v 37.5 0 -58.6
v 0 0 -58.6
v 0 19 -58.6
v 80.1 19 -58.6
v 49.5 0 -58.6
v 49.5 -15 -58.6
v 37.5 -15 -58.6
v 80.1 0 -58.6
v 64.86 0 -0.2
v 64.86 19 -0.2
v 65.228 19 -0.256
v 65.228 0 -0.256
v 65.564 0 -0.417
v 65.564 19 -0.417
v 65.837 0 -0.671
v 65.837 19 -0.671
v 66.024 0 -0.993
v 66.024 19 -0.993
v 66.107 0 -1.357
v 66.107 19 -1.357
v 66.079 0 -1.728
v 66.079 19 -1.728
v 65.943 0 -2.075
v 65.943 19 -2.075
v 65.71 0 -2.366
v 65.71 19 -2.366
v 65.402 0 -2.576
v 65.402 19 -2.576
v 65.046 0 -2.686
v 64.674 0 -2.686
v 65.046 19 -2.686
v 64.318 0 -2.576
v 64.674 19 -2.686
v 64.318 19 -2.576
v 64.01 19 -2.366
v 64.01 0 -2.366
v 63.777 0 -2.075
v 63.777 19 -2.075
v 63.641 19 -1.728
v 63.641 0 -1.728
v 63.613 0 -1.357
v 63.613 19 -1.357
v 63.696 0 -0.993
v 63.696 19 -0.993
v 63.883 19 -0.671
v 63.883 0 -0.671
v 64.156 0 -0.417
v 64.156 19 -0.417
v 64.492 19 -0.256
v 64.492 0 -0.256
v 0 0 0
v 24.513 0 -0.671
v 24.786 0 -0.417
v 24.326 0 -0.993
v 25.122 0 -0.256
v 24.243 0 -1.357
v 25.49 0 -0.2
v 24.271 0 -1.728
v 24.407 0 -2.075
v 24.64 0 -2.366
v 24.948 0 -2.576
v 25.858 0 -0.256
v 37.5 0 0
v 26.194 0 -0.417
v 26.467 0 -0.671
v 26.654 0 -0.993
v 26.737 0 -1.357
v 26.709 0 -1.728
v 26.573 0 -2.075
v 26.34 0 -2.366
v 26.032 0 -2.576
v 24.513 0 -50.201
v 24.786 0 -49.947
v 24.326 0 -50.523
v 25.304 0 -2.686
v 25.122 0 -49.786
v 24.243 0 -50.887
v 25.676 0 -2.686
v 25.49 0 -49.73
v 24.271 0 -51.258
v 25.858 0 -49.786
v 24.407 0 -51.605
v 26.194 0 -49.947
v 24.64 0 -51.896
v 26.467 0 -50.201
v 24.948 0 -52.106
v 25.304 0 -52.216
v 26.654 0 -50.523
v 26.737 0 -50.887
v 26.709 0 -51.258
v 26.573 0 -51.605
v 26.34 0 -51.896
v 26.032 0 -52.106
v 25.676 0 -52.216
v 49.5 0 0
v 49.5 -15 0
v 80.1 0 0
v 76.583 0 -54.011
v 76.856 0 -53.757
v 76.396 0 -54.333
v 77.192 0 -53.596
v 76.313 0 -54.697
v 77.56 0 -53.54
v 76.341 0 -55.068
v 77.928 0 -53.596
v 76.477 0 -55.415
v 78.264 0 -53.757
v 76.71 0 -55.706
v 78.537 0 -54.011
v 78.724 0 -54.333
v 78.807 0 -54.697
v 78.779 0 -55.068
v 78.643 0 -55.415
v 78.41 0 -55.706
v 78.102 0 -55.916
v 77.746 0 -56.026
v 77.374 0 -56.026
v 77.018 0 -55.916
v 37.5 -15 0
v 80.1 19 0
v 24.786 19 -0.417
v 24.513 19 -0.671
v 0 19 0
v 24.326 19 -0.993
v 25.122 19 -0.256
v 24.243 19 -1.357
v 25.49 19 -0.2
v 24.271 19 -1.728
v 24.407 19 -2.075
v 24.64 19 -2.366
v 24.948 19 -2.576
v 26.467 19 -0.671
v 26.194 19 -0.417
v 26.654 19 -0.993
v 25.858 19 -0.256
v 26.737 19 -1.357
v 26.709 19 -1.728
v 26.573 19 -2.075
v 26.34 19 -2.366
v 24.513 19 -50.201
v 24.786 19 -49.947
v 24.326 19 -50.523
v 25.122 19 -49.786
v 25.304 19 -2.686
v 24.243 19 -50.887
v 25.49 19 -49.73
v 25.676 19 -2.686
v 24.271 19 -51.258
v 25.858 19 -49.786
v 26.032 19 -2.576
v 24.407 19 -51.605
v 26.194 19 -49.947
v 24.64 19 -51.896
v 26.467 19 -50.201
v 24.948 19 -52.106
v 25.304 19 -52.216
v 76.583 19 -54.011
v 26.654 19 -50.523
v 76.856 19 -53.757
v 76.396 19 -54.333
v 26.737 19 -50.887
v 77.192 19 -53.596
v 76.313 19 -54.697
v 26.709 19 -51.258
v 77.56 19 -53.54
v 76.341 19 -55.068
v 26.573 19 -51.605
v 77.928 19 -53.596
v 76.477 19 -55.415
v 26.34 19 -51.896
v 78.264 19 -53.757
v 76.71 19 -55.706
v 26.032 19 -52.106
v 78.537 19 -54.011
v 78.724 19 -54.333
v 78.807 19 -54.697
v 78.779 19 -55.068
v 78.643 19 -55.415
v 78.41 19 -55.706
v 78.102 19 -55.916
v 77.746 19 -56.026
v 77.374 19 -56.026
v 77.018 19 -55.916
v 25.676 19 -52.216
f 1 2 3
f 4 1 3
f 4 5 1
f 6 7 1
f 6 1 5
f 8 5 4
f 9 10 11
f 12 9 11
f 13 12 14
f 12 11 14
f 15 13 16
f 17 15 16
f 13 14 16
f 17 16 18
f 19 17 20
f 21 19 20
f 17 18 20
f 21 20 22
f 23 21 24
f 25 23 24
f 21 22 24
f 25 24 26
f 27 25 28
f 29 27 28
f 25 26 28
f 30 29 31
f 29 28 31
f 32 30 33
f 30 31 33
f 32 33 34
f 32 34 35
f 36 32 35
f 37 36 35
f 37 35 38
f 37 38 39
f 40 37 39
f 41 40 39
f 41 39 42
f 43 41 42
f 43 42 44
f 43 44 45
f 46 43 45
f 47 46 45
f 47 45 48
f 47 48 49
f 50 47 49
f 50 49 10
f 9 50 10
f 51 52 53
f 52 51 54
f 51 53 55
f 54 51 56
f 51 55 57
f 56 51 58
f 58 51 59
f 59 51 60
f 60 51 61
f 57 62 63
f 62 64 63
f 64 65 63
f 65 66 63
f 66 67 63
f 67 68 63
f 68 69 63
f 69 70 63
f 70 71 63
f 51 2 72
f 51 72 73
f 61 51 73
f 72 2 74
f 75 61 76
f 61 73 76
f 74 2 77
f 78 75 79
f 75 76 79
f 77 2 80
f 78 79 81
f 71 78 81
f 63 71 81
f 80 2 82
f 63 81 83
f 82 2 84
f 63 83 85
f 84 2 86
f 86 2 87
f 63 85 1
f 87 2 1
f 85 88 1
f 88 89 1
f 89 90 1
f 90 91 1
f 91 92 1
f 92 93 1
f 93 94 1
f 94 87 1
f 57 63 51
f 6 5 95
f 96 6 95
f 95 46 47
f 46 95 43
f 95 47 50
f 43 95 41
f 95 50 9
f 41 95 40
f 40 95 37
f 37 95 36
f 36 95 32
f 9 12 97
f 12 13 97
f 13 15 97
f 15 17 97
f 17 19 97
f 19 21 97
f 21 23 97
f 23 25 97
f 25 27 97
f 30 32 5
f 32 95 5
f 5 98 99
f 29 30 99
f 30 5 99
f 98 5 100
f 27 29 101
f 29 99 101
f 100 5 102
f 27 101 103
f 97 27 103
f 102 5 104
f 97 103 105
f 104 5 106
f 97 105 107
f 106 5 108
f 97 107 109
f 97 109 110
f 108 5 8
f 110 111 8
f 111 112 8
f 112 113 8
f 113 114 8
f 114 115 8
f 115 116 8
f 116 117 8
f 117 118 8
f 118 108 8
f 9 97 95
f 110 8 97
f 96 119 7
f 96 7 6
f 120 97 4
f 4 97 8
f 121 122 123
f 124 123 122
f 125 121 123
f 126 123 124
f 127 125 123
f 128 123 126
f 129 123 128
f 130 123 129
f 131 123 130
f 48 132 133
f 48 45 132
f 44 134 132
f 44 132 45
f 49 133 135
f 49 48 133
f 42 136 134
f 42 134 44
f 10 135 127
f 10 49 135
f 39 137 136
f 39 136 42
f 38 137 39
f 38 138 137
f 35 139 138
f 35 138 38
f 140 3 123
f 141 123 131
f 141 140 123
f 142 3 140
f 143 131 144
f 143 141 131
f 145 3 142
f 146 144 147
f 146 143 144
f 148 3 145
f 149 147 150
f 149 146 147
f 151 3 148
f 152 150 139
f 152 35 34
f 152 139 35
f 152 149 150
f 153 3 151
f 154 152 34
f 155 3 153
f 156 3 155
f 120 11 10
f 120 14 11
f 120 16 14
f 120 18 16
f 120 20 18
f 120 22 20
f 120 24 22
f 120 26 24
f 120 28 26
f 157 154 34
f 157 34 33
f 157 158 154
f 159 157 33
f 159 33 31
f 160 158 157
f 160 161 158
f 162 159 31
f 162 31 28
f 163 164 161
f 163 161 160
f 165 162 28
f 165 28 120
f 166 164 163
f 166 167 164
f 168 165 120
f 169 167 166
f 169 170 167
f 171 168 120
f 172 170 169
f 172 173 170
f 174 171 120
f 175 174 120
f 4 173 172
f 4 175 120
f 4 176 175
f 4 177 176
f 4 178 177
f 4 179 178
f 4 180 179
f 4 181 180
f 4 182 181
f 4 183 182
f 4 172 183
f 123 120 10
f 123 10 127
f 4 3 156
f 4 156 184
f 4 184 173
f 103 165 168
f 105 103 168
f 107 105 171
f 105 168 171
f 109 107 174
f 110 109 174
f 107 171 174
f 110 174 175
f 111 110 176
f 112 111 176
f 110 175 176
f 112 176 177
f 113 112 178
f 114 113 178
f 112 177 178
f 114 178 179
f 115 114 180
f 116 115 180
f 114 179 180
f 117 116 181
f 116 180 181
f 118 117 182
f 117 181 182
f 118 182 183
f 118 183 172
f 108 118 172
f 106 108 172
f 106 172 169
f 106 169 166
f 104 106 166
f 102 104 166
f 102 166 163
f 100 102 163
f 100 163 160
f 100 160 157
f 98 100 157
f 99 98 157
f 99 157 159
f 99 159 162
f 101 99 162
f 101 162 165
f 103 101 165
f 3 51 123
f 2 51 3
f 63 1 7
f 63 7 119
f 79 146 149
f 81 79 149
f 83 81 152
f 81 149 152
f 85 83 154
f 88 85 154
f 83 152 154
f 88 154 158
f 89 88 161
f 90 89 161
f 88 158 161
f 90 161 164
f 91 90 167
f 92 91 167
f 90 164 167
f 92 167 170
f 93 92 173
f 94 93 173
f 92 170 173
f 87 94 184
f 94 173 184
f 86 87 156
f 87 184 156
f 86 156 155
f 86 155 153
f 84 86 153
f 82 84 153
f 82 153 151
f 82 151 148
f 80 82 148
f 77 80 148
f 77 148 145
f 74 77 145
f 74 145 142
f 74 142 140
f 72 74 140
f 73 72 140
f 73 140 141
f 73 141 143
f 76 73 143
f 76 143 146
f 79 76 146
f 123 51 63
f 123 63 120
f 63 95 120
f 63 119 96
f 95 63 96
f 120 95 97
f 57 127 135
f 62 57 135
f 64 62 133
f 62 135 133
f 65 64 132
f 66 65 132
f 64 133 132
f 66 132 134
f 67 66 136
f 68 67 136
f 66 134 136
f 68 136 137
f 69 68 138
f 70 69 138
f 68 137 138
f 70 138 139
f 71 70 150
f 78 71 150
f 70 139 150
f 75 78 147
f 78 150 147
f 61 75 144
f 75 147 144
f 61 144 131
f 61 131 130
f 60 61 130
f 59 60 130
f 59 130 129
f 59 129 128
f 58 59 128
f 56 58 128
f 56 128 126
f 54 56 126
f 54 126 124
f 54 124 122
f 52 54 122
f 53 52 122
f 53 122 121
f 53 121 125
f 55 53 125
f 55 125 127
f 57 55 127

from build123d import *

# Parameters (mm, degrees)
ESQUISSE1_W             = 80.1
ESQUISSE1_H             = 58.6
BOSS_EXTRU_1_DEPTH      = 19
ESQUISSE2_W             = 12
ESQUISSE2_H             = 58.6
BOSS_EXTRU_2_DEPTH      = 15
ESQUISSE3_R             = 1.25
ENL_V_MAT_EXTRU_1_DEPTH = 105.909341815


with BuildPart() as part:
    # Esquisse1 → Boss.-Extru.1 (new body)
    with BuildSketch(Plane(origin=(0, 0, 0), x_dir=(1, 0, 0), z_dir=(0, 1, 0))):
        with Locations((40.05, 29.3)):
            Rectangle(ESQUISSE1_W, ESQUISSE1_H)
    extrude(amount=BOSS_EXTRU_1_DEPTH)

    # Esquisse2 → Boss.-Extru.2 (add)
    with BuildSketch(Plane.XZ):
        with Locations((43.5, -29.3)):
            Rectangle(ESQUISSE2_W, ESQUISSE2_H)
    extrude(amount=BOSS_EXTRU_2_DEPTH)

    # Esquisse3 → Enlèv. mat.-Extru.1 (cut, through all)
    with BuildSketch(Plane(origin=(0, 19, 0), x_dir=(1, 0, 0), z_dir=(0, 1, 0))):
        with Locations(Location((77.56, 54.79, 0), (0, 0, 270))):
            Circle(ESQUISSE3_R)
        with Locations(Location((25.49, 50.98, 0), (0, 0, 270))):
            Circle(ESQUISSE3_R)
        with Locations(Location((25.49, 1.45, 0), (0, 0, 270))):
            Circle(ESQUISSE3_R)
        with Locations(Location((64.86, 1.45, 0), (0, 0, 270))):
            Circle(ESQUISSE3_R)
    extrude(amount=-ENL_V_MAT_EXTRU_1_DEPTH, mode=Mode.SUBTRACT)


solid = part.part
